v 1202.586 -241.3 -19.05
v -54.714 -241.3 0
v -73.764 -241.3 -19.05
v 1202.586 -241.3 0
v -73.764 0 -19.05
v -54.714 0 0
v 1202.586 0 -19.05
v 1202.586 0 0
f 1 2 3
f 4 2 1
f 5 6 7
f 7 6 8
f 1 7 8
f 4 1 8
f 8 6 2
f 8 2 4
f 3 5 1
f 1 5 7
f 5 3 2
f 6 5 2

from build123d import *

# Parameters (mm, degrees)
F0_W     = 1276.35
F0_H     = 19.05
F1_DEPTH = 241.3
F5_DEPTH = 241.301


with BuildPart() as f1:
    # F0 (on Front) → F1 (new body)
    with BuildSketch(Plane.XZ):
        with Locations((564.411236, -9.525)):
            Rectangle(F0_W, F0_H)
    extrude(amount=F1_DEPTH)

    # F4 (on face) → F5 (cut, through all)
    with BuildSketch(Plane.XZ.offset(241.3)):
        Polygon((-73.763764, 0), (-73.763764, -19.05), (-54.713764, 0), align=None)
    extrude(amount=-F5_DEPTH, mode=Mode.SUBTRACT)


with BuildPart() as f2_1:
    # F2: copy of F1
    add(f1.part.moved(Location((0, 0, 381))))


solid = f1.part
